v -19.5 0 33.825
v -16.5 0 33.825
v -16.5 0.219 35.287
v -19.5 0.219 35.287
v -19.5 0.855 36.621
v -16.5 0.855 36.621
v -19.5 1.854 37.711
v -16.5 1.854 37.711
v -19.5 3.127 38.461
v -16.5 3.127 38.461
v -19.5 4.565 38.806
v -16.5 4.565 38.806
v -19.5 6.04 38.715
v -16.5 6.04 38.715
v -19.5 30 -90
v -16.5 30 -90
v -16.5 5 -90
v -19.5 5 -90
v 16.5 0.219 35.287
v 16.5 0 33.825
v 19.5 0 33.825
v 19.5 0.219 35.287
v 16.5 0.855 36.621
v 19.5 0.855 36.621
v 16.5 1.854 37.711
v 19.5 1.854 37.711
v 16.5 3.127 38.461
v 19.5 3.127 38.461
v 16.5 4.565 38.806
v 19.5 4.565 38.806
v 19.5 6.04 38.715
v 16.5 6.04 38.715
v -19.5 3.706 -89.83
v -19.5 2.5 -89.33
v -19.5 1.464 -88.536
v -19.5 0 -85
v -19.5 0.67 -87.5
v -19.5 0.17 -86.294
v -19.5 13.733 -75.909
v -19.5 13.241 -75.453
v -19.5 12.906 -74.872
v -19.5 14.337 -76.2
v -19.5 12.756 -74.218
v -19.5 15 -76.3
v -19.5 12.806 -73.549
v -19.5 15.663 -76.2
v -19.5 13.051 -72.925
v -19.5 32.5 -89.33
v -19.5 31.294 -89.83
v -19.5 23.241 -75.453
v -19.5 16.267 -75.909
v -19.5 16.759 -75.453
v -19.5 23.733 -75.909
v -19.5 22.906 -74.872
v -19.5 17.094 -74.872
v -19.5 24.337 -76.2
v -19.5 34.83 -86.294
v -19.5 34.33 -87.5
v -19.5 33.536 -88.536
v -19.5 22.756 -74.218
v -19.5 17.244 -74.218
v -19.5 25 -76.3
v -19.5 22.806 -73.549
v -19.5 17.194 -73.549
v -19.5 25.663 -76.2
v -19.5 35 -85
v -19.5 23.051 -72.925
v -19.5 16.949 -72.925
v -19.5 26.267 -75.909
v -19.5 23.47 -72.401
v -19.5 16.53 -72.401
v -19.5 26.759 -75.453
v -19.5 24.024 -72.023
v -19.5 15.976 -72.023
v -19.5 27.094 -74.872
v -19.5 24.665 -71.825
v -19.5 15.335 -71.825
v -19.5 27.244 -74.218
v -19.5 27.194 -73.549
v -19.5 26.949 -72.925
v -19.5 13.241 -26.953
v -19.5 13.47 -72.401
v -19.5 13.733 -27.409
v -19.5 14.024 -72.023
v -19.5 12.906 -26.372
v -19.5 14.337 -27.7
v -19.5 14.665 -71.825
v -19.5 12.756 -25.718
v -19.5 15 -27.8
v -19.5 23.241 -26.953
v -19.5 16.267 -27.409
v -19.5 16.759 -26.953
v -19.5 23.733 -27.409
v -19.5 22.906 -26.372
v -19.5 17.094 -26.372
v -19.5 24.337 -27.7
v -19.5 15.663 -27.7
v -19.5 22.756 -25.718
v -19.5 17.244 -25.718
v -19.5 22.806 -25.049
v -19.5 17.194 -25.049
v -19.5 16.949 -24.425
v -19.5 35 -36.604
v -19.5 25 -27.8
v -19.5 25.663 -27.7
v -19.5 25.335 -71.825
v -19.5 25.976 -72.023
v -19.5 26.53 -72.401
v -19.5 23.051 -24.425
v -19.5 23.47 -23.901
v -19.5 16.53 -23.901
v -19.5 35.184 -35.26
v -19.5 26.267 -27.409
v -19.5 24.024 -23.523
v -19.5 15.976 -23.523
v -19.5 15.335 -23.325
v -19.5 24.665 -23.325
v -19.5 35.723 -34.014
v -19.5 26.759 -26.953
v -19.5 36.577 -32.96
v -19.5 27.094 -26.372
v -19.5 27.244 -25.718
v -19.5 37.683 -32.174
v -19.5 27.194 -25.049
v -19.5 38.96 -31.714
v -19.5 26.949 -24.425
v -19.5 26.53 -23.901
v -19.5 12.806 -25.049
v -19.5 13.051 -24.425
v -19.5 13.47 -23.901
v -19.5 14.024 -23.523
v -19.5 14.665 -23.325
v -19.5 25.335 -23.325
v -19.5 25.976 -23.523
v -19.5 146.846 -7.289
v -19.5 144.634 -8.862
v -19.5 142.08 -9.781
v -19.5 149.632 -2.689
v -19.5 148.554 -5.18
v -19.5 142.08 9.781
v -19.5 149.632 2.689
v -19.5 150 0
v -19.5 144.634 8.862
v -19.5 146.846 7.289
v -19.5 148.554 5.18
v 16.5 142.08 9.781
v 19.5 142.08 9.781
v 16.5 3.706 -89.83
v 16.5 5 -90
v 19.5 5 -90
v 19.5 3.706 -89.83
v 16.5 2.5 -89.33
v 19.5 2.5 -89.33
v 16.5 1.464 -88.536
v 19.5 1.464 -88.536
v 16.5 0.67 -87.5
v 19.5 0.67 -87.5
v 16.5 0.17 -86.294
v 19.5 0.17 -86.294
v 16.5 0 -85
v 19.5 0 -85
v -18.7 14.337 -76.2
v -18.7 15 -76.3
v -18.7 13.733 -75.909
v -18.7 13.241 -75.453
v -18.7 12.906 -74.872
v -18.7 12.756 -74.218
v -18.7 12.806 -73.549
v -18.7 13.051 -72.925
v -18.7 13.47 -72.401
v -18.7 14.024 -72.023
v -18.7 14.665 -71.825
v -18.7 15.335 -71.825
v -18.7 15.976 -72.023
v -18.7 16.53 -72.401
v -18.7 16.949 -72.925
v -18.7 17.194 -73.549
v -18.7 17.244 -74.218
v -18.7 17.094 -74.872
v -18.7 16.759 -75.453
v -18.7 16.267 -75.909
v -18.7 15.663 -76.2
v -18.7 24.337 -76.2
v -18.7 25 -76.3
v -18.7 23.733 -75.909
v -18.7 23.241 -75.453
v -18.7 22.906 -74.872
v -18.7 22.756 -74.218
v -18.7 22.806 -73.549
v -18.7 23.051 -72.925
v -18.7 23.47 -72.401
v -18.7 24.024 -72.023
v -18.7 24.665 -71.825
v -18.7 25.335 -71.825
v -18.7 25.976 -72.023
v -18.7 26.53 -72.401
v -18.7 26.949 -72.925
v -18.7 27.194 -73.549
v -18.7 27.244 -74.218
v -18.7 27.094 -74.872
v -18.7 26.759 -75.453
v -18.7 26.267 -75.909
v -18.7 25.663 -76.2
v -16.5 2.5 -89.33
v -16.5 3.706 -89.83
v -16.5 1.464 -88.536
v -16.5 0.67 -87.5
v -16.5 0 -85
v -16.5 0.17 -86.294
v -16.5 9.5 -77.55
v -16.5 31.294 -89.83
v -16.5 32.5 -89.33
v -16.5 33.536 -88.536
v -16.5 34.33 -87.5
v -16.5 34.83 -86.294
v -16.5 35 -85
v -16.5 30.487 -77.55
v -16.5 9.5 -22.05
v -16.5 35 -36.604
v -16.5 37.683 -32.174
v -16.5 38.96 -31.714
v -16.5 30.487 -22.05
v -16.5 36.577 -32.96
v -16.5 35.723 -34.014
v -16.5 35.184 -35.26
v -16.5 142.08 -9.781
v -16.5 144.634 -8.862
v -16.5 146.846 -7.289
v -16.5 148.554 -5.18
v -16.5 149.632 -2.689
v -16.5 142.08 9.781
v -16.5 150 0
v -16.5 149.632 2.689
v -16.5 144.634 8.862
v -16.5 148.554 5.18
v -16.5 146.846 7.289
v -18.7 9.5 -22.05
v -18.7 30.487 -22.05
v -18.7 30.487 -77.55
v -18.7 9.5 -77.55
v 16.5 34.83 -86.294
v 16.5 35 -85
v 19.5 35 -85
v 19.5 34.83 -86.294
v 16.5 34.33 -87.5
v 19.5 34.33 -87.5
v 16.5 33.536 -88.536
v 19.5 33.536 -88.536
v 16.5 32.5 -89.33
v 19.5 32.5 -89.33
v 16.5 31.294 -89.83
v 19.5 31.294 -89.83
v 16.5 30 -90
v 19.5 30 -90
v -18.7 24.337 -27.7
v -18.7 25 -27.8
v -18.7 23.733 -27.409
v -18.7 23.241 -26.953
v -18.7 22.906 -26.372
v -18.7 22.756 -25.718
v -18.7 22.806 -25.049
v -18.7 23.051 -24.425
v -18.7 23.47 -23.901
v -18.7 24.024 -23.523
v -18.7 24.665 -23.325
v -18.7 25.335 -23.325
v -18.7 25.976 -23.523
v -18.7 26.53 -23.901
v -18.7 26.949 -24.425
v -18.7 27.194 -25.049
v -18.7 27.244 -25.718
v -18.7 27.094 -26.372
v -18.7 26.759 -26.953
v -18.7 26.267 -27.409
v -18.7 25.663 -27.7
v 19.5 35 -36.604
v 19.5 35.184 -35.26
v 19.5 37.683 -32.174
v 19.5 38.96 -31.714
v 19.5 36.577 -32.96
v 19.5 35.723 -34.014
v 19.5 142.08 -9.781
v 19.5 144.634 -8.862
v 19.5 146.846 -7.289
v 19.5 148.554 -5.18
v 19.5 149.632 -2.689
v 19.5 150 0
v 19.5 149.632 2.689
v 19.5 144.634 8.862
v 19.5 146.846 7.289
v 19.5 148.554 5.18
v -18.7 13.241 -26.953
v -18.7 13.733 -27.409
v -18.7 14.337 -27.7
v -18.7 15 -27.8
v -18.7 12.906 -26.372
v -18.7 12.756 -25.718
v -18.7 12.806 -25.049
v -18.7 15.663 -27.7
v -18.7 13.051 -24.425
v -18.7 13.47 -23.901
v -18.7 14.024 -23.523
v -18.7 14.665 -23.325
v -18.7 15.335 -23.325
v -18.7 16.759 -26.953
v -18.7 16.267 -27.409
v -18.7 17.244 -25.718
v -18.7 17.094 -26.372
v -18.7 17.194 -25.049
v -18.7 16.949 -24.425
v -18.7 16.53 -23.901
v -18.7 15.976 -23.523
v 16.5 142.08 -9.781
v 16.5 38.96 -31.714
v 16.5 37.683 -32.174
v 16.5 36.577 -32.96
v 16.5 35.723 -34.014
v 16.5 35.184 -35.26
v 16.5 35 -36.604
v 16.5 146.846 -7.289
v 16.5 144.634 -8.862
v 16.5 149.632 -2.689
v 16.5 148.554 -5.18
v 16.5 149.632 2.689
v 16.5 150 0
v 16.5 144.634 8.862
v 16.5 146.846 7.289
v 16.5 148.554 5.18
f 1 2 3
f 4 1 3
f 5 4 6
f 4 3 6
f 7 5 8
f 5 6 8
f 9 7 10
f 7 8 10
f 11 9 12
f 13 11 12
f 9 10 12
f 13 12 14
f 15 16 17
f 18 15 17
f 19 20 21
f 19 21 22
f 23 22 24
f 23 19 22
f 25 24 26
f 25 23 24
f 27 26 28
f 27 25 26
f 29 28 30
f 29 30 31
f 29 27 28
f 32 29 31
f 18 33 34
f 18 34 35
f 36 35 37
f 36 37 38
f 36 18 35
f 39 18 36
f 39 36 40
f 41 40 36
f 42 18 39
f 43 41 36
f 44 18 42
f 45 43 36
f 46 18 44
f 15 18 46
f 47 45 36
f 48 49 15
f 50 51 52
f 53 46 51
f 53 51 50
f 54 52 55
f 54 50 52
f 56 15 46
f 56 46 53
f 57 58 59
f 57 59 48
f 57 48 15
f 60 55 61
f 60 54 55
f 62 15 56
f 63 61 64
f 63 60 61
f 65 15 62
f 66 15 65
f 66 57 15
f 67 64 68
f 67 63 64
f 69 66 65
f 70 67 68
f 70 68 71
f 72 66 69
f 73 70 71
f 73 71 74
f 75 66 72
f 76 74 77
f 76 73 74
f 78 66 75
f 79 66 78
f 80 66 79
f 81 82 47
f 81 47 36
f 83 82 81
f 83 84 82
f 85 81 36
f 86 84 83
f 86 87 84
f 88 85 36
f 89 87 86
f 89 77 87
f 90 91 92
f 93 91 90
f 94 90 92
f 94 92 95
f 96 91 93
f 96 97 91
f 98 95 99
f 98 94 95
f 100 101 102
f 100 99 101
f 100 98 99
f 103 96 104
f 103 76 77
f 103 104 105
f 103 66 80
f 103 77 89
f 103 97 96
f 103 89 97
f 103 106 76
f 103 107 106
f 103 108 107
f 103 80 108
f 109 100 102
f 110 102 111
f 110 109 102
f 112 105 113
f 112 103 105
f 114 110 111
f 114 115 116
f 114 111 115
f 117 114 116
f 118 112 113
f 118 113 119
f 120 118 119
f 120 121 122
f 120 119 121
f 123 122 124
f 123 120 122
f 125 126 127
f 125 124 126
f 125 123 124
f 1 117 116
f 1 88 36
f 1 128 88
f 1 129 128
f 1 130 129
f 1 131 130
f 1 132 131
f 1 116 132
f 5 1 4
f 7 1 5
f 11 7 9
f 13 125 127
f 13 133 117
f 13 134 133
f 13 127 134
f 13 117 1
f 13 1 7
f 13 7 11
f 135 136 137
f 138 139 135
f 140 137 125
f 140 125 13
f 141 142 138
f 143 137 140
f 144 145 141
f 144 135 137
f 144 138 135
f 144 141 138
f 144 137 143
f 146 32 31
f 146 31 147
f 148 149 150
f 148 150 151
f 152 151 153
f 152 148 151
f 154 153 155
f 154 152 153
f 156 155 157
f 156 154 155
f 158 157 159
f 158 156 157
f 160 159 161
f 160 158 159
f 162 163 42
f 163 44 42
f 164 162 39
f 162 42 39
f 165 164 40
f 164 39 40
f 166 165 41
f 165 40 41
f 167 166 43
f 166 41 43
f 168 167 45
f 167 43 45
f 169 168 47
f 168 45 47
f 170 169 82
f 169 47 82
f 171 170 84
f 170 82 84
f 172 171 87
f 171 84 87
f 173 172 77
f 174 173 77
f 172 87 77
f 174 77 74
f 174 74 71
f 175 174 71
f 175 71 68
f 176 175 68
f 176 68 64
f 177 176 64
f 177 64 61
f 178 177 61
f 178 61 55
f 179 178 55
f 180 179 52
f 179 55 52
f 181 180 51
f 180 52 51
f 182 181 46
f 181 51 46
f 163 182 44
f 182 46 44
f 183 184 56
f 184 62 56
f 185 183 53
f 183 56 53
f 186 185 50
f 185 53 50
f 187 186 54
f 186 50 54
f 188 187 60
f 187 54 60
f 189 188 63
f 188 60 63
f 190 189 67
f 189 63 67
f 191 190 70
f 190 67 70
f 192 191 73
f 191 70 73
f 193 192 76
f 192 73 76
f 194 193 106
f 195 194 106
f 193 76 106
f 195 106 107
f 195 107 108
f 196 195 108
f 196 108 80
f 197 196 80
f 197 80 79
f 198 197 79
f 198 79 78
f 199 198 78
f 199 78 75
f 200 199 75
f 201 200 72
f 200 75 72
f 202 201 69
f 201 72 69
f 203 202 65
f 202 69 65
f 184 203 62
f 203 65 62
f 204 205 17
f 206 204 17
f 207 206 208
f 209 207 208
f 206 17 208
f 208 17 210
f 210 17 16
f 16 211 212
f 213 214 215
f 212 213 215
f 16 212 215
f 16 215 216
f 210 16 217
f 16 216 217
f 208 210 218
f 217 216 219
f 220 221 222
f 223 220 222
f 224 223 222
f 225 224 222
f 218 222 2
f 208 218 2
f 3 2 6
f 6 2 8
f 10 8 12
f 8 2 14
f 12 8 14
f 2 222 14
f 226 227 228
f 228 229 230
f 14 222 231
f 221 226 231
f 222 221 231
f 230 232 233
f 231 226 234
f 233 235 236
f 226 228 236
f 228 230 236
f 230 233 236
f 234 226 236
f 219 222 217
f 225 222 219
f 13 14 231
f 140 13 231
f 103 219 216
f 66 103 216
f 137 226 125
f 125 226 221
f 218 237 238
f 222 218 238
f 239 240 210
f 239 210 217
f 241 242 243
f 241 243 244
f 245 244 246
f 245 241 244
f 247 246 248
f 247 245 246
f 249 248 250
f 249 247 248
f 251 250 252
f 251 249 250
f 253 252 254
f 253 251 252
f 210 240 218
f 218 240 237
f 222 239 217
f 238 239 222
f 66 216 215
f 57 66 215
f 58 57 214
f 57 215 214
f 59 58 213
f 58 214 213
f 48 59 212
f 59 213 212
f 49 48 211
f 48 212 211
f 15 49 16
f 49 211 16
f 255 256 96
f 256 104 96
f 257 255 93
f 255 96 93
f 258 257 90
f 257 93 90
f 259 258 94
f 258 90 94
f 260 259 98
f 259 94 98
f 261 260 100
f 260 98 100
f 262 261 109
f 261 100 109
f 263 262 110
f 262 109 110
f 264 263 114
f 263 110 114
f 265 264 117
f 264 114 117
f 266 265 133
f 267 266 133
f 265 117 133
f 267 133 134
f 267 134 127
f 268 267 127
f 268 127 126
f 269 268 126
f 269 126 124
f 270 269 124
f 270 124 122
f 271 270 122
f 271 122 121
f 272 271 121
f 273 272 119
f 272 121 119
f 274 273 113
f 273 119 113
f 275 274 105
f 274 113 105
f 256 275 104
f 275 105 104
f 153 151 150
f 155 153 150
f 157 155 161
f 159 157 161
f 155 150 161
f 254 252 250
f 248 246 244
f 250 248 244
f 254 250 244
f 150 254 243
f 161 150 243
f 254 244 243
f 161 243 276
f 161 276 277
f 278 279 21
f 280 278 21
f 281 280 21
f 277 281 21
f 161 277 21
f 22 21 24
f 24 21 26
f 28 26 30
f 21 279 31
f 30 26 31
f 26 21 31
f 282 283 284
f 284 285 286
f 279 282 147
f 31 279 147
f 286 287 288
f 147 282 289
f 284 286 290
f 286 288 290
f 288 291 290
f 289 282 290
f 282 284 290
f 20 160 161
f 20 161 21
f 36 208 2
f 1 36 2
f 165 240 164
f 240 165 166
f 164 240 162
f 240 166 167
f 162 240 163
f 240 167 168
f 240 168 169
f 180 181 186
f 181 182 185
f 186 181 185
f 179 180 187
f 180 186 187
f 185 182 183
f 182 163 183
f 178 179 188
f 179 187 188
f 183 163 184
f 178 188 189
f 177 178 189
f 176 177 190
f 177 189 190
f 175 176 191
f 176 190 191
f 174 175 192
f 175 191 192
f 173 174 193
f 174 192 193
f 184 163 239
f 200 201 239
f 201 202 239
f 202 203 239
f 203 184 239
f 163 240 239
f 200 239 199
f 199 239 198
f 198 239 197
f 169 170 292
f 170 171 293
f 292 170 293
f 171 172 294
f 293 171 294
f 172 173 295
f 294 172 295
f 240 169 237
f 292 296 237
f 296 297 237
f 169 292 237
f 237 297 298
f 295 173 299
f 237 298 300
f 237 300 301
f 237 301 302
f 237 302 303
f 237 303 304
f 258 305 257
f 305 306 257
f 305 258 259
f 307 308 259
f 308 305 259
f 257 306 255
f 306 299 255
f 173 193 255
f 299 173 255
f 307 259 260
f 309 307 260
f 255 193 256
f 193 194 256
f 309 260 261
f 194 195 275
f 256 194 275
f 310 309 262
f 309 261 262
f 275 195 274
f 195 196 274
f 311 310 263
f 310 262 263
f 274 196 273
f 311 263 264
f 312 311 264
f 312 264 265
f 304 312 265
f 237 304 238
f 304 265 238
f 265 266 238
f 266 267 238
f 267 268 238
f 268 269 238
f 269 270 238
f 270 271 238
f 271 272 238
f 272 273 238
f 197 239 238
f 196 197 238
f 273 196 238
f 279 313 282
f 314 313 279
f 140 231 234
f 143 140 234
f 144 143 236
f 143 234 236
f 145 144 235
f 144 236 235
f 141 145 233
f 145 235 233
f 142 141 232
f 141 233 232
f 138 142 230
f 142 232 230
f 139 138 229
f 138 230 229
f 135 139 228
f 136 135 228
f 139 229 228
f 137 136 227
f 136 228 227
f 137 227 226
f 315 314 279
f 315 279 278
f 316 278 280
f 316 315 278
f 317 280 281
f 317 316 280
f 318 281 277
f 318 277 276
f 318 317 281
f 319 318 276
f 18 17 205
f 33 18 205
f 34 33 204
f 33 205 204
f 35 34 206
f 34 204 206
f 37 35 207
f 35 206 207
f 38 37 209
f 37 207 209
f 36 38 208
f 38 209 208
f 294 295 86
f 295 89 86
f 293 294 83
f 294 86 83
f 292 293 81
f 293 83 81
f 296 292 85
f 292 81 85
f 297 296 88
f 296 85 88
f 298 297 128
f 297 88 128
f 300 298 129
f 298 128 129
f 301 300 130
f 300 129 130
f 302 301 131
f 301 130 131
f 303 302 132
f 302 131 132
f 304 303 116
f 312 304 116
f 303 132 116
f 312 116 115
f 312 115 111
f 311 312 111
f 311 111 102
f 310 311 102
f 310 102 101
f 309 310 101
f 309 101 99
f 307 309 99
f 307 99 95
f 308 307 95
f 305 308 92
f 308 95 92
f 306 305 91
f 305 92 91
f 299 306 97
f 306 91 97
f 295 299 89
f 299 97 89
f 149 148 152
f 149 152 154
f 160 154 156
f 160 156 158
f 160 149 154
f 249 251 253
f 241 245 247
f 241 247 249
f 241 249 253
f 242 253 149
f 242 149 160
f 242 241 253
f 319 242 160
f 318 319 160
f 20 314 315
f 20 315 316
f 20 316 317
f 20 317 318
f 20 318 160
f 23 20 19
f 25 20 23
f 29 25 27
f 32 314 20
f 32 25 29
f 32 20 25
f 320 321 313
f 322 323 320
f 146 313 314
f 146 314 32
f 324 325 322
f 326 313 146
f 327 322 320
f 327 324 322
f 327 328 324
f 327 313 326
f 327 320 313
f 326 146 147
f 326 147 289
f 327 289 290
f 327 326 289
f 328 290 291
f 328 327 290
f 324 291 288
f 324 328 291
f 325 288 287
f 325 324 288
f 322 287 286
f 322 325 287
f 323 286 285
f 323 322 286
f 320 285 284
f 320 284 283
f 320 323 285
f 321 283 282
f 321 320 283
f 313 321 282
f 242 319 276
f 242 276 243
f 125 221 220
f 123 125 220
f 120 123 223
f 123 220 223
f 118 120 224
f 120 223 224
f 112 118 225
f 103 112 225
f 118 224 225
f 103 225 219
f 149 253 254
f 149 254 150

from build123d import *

# Parameters (mm, degrees)
BOSS_EXTRUDE1_DEPTH           = 3
SKETCH6_W                     = 55.5
SKETCH6_H                     = 20.98660254
CUT_EXTRUDE1_DEPTH            = 2.2
SKETCH12_W                    = 2.25
SKETCH12_H                    = 0.8
M4_CLEARANCE_HOLE1_AT_2_COUNT = 2
M4_CLEARANCE_HOLE1_AT_2_PITCH = 48.5
M4_CLEARANCE_HOLE1_AT_3_COUNT = 2
M4_CLEARANCE_HOLE1_AT_3_PITCH = 49.520197899
M4_CLEARANCE_HOLE1_AT_4_COUNT = 2
M4_CLEARANCE_HOLE1_AT_4_PITCH = 10


with BuildPart() as part:
    # Sketch3 → Boss-Extrude1 (new body)
    with BuildSketch(Plane(origin=(16.5, 0, 0), x_dir=(0, 0, -1), z_dir=(1, 0, 0))):
        with BuildLine():
            ThreePointArc((-9.781214465, 142.08034699), (0, 150), (9.781214465, 142.08034699))
            Line((9.781214465, 142.08034699), (31.71371223, 38.959826505))
            ThreePointArc((31.71371223, 38.959826505), (33.457961844, 36.114072345), (36.604319462, 35))
            Line((36.604319462, 35), (85, 35))
            ThreePointArc((85, 35), (88.535533906, 33.535533906), (90, 30))
            Line((90, 30), (90, 5))
            ThreePointArc((90, 5), (88.535533906, 1.464466094), (85, 0))
            Line((85, 0), (0, 0))
            Line((0, 0), (-33.824720318, 0))
            ThreePointArc((-33.824720318, 0), (-37.710647973, 1.853642382), (-38.71532755, 6.040173495))
            Line((-38.71532755, 6.040173495), (-9.781214465, 142.08034699))
        make_face()
    extrude(amount=BOSS_EXTRUDE1_DEPTH)


with BuildPart() as body_2:
    # Mirror2: mirrored copy
    add(part.part.mirror(Plane(origin=(0, 0, 0), x_dir=(0, 0, 1), z_dir=(1, 0, 0))))

    # Sketch6 → Cut-Extrude1 (cut)
    with BuildSketch(Plane.ZY.offset(18.7)):
        with Locations((-49.8, 19.99330127)):
            Rectangle(SKETCH6_W, SKETCH6_H)
    extrude(amount=-CUT_EXTRUDE1_DEPTH, mode=Mode.SUBTRACT)

    # Sketch12 → M4 Clearance Hole1 (revolve, cut)
    with BuildSketch(Plane(origin=(-18.7, 15, -25.55), x_dir=(0, 0, -1), z_dir=(0, 1, 0))):
        with Locations((1.125, 0.4)):
            Rectangle(SKETCH12_W, SKETCH12_H)
    m4_clearance_hole1 = revolve(axis=Axis((-12.35, 15, -25.55), (-1, 0, 0)), mode=Mode.SUBTRACT)

    # M4 Clearance Hole1 at 2: M4 Clearance Hole1 ×2
    with Locations(*[(0, 0, -i * M4_CLEARANCE_HOLE1_AT_2_PITCH) for i in range(1, M4_CLEARANCE_HOLE1_AT_2_COUNT)]):
        add(m4_clearance_hole1, mode=Mode.SUBTRACT)

    # M4 Clearance Hole1 at 3: M4 Clearance Hole1 ×2
    with Locations(*[Vector(0, 0.201937804, -0.979398348) * (i * M4_CLEARANCE_HOLE1_AT_3_PITCH) for i in range(1, M4_CLEARANCE_HOLE1_AT_3_COUNT)]):
        add(m4_clearance_hole1, mode=Mode.SUBTRACT)

    # M4 Clearance Hole1 at 4: M4 Clearance Hole1 ×2
    with Locations(*[(0, i * M4_CLEARANCE_HOLE1_AT_4_PITCH, 0) for i in range(1, M4_CLEARANCE_HOLE1_AT_4_COUNT)]):
        add(m4_clearance_hole1, mode=Mode.SUBTRACT)


solid = Compound([part.part, body_2.part])
